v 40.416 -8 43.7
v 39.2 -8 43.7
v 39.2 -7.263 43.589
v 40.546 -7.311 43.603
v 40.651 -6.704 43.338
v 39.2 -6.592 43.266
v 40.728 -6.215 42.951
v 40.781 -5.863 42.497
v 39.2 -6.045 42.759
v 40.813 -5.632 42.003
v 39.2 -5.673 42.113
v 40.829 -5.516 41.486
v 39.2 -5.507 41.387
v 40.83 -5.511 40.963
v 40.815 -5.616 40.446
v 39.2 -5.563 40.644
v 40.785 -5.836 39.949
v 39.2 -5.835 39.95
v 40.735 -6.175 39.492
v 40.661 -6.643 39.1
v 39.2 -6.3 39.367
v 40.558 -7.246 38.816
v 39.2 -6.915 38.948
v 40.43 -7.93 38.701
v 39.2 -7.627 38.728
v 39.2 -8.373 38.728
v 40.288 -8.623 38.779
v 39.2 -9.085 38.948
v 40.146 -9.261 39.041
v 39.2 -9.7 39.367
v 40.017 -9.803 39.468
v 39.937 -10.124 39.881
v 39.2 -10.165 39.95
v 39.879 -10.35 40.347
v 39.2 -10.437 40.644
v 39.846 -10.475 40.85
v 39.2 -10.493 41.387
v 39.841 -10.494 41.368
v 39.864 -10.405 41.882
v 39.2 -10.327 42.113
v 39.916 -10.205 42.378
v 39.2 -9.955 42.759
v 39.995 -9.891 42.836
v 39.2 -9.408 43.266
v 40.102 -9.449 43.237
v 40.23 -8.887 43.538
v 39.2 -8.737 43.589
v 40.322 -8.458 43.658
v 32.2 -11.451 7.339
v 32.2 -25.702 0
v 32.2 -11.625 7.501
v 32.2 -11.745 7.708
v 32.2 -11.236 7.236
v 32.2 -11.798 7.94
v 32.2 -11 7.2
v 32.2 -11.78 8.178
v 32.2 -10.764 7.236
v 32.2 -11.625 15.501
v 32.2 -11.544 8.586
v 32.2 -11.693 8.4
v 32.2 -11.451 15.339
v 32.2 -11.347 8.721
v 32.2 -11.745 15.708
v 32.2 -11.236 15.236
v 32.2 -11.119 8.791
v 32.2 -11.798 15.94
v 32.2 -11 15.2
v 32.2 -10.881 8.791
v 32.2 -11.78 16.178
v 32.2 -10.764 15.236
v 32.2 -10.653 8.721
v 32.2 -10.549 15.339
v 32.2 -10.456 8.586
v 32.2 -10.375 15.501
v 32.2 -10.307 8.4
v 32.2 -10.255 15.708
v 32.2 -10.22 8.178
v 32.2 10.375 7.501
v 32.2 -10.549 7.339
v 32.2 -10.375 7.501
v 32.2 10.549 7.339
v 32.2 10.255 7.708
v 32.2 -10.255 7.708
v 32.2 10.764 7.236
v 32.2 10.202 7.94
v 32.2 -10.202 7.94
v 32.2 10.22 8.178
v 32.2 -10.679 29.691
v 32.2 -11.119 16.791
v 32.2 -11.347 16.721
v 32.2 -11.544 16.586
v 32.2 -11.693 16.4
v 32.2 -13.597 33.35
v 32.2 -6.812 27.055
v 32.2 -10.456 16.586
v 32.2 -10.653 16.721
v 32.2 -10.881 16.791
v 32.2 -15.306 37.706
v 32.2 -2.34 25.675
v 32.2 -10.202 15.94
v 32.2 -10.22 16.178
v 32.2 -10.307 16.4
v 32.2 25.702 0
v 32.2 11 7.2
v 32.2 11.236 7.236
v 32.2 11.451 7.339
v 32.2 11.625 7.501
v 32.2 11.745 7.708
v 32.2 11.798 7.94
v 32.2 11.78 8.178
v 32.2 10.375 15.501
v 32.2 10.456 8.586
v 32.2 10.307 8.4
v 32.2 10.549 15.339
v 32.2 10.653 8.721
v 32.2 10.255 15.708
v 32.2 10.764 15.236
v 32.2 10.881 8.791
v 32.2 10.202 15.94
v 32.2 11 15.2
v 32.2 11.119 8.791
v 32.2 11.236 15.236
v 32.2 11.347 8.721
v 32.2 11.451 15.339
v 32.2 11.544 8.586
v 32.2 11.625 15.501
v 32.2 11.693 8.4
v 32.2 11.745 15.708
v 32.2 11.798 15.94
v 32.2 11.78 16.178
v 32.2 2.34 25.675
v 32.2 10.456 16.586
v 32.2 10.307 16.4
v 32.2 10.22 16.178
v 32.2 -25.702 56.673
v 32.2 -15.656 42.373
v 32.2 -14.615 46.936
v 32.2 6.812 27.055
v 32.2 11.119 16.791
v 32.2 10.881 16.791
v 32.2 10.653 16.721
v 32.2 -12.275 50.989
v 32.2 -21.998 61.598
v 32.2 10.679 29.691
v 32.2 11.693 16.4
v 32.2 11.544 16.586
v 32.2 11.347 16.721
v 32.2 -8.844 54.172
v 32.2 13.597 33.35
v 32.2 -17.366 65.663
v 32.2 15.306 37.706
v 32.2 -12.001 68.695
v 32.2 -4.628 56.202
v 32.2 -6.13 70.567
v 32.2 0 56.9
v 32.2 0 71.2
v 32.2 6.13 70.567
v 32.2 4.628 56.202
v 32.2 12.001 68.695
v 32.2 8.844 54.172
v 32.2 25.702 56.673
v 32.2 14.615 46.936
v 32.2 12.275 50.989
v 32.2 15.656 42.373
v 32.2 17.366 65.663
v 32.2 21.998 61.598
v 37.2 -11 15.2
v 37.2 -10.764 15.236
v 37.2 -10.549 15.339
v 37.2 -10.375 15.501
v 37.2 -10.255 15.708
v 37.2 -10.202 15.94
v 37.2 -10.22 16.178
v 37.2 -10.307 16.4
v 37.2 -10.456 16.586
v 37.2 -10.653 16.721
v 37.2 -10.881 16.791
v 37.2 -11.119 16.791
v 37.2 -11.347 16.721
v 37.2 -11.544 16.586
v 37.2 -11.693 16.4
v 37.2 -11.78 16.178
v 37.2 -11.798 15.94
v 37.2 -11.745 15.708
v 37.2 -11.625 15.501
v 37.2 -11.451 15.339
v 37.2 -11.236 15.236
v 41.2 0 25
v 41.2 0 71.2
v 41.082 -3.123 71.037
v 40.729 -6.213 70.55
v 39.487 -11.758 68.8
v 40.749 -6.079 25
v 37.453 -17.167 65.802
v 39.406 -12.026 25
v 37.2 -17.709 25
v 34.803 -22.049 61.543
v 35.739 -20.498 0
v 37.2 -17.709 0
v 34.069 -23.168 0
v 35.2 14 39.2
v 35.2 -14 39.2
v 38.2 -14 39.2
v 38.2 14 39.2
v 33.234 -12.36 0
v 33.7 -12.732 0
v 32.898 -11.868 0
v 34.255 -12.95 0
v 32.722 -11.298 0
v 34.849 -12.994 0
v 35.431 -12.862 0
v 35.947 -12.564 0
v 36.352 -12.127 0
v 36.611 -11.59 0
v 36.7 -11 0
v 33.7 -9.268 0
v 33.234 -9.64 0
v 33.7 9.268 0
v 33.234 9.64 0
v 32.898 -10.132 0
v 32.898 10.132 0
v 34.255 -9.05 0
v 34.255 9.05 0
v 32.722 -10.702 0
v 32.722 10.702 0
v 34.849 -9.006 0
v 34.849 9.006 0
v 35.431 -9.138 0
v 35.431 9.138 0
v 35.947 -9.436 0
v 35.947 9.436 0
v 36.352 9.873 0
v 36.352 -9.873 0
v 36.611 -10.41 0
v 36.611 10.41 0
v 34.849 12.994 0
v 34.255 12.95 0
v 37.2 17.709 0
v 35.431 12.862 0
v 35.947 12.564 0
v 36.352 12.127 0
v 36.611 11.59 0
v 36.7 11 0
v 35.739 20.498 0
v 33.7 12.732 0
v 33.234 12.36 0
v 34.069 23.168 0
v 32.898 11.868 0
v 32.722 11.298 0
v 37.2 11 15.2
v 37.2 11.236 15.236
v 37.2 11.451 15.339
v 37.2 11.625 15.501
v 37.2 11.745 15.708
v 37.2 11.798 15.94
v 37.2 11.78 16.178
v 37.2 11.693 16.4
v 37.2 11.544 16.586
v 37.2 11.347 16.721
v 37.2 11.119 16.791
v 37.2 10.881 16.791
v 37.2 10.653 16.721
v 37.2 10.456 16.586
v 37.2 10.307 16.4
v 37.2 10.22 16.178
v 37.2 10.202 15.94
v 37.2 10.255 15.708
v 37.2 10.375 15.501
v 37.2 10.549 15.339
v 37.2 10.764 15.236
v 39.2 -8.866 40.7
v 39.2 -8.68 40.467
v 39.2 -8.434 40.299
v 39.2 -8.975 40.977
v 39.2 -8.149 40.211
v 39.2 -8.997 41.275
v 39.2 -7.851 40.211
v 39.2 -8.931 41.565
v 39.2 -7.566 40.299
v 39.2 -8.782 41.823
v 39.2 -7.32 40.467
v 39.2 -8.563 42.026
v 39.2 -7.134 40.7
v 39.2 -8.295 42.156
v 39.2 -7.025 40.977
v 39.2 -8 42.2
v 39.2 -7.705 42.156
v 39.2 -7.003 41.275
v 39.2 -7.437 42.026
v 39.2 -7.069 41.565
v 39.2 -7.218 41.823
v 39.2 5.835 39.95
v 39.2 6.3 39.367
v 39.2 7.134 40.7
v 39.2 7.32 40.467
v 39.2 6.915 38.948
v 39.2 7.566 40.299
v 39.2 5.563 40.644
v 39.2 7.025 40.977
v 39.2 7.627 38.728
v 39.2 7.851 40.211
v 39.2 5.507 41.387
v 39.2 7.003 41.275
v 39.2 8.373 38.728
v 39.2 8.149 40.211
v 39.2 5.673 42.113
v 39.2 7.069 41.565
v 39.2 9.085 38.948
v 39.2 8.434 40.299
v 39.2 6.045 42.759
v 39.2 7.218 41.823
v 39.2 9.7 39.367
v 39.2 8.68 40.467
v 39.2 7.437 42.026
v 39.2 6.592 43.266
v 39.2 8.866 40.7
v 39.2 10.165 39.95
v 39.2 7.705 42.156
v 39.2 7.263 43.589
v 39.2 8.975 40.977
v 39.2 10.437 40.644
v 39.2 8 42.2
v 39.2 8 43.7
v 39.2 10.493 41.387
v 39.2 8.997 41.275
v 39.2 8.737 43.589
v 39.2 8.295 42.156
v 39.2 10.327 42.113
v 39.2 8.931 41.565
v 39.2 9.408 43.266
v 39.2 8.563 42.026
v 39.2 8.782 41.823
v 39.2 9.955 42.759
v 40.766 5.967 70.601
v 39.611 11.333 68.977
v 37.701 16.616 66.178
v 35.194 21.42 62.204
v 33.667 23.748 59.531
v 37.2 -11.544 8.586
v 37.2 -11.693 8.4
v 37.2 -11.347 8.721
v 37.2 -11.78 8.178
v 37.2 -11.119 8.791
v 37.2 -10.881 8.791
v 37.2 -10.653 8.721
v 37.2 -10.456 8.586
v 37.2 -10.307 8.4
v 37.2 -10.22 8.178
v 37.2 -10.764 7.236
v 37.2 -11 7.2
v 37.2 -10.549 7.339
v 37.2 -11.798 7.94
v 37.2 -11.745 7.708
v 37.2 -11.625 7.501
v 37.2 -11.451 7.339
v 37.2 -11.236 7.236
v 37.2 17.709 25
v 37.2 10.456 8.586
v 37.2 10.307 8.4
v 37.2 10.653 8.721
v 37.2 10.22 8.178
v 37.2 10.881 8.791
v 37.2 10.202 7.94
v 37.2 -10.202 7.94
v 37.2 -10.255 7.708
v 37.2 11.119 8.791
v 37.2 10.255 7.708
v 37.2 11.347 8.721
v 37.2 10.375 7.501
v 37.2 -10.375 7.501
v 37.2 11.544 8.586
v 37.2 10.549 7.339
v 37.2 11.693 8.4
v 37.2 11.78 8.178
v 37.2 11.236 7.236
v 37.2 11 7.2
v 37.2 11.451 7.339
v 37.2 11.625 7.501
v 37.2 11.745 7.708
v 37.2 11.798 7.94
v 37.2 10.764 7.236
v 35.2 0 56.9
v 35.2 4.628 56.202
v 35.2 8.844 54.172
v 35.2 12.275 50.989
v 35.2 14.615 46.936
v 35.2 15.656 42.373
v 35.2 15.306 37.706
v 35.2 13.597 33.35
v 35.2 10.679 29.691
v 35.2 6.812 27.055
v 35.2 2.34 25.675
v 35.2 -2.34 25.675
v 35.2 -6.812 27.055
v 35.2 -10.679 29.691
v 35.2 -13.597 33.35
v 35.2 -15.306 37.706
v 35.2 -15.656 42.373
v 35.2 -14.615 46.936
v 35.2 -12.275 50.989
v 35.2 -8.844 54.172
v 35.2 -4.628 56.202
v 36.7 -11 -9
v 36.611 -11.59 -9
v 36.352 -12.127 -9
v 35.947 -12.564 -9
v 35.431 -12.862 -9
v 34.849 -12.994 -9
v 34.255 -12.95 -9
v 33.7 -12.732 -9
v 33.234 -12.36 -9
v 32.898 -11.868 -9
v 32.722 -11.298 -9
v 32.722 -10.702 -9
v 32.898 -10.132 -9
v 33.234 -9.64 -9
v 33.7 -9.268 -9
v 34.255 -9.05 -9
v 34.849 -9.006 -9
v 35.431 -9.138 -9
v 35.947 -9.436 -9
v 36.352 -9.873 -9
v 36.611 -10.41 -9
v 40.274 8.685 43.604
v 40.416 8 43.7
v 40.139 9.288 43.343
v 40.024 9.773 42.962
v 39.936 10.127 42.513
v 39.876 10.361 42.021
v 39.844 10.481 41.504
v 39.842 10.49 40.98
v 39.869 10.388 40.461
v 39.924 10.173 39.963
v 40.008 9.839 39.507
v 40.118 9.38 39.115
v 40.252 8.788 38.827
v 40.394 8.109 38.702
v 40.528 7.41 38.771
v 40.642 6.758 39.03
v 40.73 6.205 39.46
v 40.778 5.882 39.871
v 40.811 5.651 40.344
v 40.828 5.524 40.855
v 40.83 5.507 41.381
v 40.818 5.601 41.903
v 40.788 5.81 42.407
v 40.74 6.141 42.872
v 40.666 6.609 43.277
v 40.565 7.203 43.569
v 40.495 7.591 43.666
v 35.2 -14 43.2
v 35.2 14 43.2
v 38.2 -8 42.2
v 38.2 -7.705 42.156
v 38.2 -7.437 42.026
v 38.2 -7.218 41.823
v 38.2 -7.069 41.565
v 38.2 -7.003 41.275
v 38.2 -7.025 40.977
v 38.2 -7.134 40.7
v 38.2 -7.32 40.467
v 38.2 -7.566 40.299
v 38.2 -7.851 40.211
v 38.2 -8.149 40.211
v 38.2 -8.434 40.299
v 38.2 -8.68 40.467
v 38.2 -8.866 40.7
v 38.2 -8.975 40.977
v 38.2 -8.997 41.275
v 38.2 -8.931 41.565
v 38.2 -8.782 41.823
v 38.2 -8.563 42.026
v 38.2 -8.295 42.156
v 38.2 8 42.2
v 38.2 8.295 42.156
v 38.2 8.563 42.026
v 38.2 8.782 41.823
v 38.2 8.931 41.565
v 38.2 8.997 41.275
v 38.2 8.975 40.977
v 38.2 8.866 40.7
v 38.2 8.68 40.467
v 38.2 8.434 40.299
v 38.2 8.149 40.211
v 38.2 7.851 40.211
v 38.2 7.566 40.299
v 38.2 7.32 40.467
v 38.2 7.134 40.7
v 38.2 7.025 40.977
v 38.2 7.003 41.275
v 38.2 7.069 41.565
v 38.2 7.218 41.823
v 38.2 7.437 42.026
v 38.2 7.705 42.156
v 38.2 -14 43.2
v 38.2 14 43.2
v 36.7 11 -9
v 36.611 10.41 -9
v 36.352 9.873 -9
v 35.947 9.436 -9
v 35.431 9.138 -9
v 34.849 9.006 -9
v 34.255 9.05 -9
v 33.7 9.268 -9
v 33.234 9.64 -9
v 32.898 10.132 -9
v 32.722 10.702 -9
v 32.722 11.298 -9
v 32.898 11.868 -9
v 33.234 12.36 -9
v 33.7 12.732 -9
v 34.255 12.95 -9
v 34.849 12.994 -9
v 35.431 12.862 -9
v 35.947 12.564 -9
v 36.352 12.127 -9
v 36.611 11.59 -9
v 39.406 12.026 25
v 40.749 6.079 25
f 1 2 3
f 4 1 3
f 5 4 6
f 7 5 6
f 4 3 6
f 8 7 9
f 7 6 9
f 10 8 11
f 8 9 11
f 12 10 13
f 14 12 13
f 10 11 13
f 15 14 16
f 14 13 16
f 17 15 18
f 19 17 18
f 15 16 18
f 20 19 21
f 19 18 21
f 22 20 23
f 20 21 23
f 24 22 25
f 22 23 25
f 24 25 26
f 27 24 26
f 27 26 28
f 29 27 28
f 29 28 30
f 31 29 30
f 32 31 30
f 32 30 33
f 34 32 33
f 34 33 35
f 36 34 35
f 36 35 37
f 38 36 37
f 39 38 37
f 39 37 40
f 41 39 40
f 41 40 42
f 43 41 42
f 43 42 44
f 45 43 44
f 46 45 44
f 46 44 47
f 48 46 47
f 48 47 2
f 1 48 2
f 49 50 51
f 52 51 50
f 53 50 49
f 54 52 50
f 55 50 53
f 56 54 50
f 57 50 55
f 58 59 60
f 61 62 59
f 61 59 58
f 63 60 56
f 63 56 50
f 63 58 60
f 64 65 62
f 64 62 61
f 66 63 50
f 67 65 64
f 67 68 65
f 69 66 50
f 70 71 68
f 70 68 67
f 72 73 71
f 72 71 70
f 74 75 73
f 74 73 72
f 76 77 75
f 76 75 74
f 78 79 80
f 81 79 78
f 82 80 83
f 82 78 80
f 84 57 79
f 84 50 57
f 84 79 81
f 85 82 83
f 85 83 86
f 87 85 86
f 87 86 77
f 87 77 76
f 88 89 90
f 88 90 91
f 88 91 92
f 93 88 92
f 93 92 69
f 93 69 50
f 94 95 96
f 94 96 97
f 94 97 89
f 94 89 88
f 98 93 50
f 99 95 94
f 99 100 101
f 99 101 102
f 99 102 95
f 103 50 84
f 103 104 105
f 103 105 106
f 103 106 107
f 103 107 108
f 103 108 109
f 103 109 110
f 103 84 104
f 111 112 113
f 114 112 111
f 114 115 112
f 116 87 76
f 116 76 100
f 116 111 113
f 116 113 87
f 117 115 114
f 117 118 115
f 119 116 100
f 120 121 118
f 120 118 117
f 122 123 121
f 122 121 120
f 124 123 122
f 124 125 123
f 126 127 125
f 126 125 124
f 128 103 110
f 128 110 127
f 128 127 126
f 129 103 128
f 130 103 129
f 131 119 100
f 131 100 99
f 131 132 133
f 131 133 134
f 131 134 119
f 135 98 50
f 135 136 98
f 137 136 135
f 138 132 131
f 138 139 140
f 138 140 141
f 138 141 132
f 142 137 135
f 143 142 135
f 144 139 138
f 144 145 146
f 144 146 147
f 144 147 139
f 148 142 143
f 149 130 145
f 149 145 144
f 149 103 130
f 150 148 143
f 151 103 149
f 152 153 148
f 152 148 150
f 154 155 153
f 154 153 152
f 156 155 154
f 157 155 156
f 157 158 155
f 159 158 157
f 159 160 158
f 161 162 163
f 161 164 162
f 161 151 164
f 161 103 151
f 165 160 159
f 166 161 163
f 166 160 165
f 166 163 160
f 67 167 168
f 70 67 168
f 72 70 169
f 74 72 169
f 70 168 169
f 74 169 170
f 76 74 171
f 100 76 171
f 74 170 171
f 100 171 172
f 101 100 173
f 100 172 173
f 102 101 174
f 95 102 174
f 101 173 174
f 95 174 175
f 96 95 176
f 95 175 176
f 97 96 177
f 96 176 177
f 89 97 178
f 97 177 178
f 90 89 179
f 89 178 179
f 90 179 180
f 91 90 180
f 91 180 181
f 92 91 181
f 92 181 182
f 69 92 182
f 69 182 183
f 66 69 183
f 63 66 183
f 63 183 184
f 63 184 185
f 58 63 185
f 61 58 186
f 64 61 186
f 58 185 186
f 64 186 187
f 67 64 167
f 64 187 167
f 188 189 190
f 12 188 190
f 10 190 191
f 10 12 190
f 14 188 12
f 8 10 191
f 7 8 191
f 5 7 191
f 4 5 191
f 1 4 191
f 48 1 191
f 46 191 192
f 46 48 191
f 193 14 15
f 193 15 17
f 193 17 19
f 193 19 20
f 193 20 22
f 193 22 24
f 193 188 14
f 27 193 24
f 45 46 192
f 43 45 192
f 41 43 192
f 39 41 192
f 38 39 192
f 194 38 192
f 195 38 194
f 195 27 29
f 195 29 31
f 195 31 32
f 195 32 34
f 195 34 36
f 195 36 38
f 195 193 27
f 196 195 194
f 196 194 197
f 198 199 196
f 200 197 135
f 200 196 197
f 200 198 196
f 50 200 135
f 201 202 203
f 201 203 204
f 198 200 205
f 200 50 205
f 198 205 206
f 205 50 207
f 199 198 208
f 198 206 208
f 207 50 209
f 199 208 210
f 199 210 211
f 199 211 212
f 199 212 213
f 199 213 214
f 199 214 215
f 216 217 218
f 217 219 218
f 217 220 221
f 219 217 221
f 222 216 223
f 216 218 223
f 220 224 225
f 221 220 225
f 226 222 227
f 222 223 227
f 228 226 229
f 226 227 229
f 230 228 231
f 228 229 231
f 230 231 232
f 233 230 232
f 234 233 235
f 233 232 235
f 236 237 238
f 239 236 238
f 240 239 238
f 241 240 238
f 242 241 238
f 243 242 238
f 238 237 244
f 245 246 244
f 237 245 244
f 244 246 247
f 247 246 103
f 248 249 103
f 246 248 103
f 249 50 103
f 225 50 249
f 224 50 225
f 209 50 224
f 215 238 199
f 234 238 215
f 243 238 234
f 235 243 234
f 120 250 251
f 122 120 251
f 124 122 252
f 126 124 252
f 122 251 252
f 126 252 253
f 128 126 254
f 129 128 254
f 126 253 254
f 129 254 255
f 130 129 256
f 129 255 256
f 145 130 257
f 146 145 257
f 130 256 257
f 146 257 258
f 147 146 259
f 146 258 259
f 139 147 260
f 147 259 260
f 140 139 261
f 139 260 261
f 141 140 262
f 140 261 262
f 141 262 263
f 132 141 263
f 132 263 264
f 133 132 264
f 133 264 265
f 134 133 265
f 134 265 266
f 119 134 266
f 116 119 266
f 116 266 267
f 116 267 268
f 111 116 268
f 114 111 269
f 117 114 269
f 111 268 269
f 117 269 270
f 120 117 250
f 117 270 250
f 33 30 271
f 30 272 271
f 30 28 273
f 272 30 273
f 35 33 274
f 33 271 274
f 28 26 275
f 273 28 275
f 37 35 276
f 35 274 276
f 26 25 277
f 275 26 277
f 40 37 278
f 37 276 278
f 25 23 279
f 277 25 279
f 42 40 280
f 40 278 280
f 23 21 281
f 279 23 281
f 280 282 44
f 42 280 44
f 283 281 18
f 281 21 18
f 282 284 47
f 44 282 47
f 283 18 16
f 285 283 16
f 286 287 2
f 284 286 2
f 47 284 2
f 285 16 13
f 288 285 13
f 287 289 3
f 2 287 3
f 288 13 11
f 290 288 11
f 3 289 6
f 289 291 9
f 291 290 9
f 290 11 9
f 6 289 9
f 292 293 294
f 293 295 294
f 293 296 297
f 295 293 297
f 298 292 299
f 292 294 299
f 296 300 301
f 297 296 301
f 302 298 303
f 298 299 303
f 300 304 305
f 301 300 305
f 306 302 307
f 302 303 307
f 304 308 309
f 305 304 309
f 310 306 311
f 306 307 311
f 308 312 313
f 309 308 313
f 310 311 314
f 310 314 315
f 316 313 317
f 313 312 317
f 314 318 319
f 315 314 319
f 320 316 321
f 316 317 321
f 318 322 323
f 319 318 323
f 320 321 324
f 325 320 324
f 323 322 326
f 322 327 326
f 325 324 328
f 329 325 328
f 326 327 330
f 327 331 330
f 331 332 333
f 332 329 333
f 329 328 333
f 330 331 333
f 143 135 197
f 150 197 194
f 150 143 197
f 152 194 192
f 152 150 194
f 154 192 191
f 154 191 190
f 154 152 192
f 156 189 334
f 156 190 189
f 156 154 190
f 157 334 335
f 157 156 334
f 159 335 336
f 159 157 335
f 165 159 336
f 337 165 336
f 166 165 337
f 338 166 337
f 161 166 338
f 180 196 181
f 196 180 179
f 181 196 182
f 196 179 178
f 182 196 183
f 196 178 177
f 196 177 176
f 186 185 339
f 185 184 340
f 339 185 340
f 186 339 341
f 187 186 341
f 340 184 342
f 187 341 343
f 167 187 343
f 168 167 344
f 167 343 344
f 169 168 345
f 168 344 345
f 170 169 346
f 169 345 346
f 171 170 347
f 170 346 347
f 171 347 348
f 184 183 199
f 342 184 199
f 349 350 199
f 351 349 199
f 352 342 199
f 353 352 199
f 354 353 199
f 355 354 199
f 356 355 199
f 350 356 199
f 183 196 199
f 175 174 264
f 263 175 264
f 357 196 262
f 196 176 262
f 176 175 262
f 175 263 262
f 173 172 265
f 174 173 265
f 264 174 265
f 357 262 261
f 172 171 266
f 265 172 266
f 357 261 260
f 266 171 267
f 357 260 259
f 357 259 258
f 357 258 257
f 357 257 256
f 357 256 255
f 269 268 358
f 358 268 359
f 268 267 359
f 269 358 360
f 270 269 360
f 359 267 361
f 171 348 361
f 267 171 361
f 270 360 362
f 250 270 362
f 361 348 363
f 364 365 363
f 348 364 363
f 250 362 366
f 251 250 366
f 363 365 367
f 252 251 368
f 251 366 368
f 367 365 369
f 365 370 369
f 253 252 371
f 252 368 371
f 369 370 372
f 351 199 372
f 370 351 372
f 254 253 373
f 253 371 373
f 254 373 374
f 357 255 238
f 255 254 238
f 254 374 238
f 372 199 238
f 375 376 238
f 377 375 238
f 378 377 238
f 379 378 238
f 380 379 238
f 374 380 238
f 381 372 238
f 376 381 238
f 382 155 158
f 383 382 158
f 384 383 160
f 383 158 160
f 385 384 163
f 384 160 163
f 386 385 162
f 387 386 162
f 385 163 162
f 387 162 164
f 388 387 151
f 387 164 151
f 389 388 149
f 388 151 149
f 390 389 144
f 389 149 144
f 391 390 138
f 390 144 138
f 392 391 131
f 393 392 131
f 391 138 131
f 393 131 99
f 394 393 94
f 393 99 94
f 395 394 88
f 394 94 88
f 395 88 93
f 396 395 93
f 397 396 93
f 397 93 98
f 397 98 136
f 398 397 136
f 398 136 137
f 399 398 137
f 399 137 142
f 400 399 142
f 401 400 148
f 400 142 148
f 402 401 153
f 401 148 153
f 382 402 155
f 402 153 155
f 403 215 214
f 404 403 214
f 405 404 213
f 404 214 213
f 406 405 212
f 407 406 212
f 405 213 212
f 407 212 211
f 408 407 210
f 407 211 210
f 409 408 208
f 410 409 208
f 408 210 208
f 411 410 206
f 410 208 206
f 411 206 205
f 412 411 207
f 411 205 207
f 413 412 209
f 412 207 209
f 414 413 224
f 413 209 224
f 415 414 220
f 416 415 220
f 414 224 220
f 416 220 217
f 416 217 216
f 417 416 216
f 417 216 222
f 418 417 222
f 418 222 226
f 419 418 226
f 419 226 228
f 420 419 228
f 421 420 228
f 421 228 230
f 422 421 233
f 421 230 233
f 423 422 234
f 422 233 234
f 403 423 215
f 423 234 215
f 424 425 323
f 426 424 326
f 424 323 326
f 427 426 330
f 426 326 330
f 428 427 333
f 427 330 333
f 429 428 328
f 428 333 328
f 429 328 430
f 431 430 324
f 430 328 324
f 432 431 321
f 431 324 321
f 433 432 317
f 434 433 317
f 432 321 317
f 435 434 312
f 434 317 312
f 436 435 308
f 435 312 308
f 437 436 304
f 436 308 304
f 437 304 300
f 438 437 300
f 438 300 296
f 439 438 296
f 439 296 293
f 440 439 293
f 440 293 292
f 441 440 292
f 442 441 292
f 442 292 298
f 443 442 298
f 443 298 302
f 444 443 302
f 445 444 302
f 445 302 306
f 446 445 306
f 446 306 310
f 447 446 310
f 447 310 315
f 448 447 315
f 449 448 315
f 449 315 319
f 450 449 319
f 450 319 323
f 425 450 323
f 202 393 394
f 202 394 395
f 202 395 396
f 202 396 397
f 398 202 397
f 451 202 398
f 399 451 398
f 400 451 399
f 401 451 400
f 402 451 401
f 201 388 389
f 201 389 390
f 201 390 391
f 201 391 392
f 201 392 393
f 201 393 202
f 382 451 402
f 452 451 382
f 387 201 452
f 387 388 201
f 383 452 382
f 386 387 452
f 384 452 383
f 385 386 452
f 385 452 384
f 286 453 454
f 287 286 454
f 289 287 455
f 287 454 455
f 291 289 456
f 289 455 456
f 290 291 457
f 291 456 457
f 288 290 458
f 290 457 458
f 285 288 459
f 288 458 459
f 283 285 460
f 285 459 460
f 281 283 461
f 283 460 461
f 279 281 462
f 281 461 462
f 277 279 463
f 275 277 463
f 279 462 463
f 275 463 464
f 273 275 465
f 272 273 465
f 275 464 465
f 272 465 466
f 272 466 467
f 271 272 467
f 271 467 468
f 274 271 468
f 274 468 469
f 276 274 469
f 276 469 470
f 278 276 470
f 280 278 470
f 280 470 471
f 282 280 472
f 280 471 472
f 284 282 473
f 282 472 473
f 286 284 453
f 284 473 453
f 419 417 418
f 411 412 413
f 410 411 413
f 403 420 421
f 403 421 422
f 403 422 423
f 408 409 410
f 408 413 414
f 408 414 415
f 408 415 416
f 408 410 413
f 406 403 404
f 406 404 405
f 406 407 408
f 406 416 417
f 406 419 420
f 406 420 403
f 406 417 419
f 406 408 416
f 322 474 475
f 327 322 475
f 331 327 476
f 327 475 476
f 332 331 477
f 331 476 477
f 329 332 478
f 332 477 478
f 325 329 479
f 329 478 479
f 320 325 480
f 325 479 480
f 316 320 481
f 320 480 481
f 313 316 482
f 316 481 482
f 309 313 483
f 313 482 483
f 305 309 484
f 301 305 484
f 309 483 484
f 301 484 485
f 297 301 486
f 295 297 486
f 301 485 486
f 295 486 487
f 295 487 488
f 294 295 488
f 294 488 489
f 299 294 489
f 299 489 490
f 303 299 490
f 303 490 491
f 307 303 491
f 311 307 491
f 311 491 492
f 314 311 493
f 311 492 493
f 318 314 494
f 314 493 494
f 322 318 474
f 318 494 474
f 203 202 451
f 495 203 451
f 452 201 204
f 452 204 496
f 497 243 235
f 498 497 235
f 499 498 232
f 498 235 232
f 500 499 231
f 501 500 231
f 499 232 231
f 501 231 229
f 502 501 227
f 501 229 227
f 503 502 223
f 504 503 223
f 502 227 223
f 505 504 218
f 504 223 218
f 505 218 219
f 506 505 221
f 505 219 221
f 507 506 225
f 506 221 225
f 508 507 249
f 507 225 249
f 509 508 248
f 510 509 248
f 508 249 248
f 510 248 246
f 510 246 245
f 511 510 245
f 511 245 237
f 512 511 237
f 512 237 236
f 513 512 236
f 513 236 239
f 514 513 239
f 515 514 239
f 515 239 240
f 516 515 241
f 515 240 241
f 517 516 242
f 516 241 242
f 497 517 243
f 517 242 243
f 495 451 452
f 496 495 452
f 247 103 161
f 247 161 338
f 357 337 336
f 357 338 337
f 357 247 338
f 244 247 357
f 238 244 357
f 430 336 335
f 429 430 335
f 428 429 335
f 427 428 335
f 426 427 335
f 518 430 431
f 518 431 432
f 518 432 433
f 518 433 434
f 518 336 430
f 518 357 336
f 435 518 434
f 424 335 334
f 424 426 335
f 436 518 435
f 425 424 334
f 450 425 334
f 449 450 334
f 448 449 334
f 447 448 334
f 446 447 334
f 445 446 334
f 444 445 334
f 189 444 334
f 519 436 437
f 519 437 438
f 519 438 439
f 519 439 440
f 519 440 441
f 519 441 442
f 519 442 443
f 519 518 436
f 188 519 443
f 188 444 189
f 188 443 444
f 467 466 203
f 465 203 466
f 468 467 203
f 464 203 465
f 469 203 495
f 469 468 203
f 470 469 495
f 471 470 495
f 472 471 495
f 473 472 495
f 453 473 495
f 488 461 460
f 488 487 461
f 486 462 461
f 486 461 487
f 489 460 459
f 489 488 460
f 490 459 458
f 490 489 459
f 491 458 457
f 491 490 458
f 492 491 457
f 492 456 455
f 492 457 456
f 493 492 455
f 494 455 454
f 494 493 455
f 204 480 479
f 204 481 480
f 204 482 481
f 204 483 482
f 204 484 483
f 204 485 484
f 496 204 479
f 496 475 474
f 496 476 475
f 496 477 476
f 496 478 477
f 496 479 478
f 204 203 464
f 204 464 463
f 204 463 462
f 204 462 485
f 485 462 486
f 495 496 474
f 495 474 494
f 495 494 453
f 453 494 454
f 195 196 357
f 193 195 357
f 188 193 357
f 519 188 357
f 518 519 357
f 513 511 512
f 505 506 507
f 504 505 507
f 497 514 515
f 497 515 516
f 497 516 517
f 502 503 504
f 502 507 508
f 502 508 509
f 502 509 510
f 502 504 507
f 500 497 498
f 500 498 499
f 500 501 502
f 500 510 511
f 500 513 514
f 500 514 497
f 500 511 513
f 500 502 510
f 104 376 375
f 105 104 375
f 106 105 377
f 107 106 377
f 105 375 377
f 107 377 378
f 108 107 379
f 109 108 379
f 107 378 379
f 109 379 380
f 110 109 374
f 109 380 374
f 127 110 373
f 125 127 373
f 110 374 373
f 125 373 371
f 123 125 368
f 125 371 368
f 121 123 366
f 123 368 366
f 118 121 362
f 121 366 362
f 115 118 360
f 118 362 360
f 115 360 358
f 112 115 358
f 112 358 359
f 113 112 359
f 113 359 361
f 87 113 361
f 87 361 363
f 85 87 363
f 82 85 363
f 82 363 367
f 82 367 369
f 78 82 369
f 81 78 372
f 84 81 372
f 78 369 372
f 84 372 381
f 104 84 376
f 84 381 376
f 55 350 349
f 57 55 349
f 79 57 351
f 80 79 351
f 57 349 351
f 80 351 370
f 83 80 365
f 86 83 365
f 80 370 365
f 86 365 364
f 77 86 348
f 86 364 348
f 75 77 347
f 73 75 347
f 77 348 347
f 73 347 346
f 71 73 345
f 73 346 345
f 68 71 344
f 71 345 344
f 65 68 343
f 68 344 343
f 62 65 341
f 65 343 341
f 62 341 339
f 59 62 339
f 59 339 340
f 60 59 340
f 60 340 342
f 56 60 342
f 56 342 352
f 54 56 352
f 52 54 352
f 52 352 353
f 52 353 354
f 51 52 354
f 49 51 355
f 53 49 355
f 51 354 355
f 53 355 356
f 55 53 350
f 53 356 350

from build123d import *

# Parameters (mm, degrees)
SKETCH_1_W          = 9
SKETCH_1_H          = 60
EXTRUDE_1_DEPTH     = 41.2
SKETCH_4_R          = 30
EXTRUDE_3_DEPTH     = 9
CUT_EXTRUDE_1_DEPTH = 72
SKETCH_5_R          = 15.7
CUT_EXTRUDE_2_DEPTH = 3
SKETCH_6_W          = 4
SKETCH_6_H          = 28
CUT_EXTRUDE_3_DEPTH = 3
SKETCH_7_R          = 2
EXTRUDE_4_DEPTH     = 9
SKETCH_8_W          = 4
SKETCH_8_H          = 82.4
CUT_EXTRUDE_4_DEPTH = 25
SKETCH_9_R          = 0.8
CUT_EXTRUDE_5_DEPTH = 5
SKETCH_10_R         = 1
CUT_EXTRUDE_6_DEPTH = 1
SKETCH_11_R         = 2.5
CUT_EXTRUDE_7_DEPTH = 3


with BuildPart() as part:
    # 草图1 → 凸台-拉伸1 (new body)
    with BuildSketch(Plane.XY):
        with Locations((36.7, 0)):
            Rectangle(SKETCH_1_W, SKETCH_1_H)
    extrude(amount=EXTRUDE_1_DEPTH)

    # 草图4 → 凸台-拉伸3 (add)
    with BuildSketch(Plane.ZY.offset(-32.2)):
        with Locations((41.2, 0)):
            Circle(SKETCH_4_R)
    extrude(amount=-EXTRUDE_3_DEPTH)

    # 切除-拉伸1: read off the stored shape, not the designer's step
    # 切除-拉伸1 outline → 切除-拉伸1 (cut)
    with BuildSketch(Plane.XY):
        with BuildLine():
            Line((32.2, 30), (32.2, 25.702139989))
            ThreePointArc((32.2, 25.702139989), (38.884958532, 13.616166862), (41.2, 0))
            Line((41.2, 0), (41.2, 30))
            Line((41.2, 30), (32.2, 30))
        make_face()
        with BuildLine():
            Line((41.2, -30), (41.2, 0))
            ThreePointArc((41.2, 0), (38.884958532, -13.616166862), (32.2, -25.702139989))
            Line((32.2, -25.702139989), (32.2, -30))
            Line((32.2, -30), (41.2, -30))
        make_face()
    extrude(amount=CUT_EXTRUDE_1_DEPTH, mode=Mode.SUBTRACT)

    # 草图5 → 切除-拉伸2 (cut)
    with BuildSketch(Plane.ZY.offset(-32.2)):
        with Locations((41.2, 0)):
            Circle(SKETCH_5_R)
    extrude(amount=-CUT_EXTRUDE_2_DEPTH, mode=Mode.SUBTRACT)

    # 草图6 → 切除-拉伸3 (cut)
    with BuildSketch(Plane.ZY.offset(-35.2)):
        with Locations((41.2, 0)):
            Rectangle(SKETCH_6_W, SKETCH_6_H)
    extrude(amount=-CUT_EXTRUDE_3_DEPTH, mode=Mode.SUBTRACT)

    # 草图7 → 凸台-拉伸4 (add)
    with BuildSketch(Plane(origin=(0, 0, 0), x_dir=(-1, 0, 0), z_dir=(0, 0, -1))):
        with Locations(Location((-34.7, 11, 0), (0, 0, 180))):
            Circle(SKETCH_7_R)
        with Locations(Location((-34.7, -11, 0), (0, 0, 180))):
            Circle(SKETCH_7_R)
    extrude(amount=EXTRUDE_4_DEPTH)

    # 草图8 → 切除-拉伸4 (cut)
    with BuildSketch(Plane.XY):
        with Locations((39.2, 0)):
            Rectangle(SKETCH_8_W, SKETCH_8_H)
    extrude(amount=CUT_EXTRUDE_4_DEPTH, mode=Mode.SUBTRACT)

    # 草图9 → 切除-拉伸5 (cut)
    with BuildSketch(Plane(origin=(37.2, 0, 0), x_dir=(0, 0, -1), z_dir=(1, 0, 0))):
        with Locations((-16, -11)):
            Circle(SKETCH_9_R)
        with Locations((-8, -11)):
            Circle(SKETCH_9_R)
        with Locations((-16, 11)):
            Circle(SKETCH_9_R)
        with Locations((-8, 11)):
            Circle(SKETCH_9_R)
    extrude(amount=-CUT_EXTRUDE_5_DEPTH, mode=Mode.SUBTRACT)

    # 草图10 → 切除-拉伸6 (cut)
    with BuildSketch(Plane.ZY.offset(-38.2)):
        with Locations((41.2, 8)):
            Circle(SKETCH_10_R)
        with Locations((41.2, -8)):
            Circle(SKETCH_10_R)
    extrude(amount=-CUT_EXTRUDE_6_DEPTH, mode=Mode.SUBTRACT)

    # 草图11 → 切除-拉伸7 (cut)
    with BuildSketch(Plane.ZY.offset(-39.2)):
        with Locations((41.2, 8)):
            Circle(SKETCH_11_R)
        with Locations((41.2, -8)):
            Circle(SKETCH_11_R)
    extrude(amount=-CUT_EXTRUDE_7_DEPTH, mode=Mode.SUBTRACT)


solid = part.part
